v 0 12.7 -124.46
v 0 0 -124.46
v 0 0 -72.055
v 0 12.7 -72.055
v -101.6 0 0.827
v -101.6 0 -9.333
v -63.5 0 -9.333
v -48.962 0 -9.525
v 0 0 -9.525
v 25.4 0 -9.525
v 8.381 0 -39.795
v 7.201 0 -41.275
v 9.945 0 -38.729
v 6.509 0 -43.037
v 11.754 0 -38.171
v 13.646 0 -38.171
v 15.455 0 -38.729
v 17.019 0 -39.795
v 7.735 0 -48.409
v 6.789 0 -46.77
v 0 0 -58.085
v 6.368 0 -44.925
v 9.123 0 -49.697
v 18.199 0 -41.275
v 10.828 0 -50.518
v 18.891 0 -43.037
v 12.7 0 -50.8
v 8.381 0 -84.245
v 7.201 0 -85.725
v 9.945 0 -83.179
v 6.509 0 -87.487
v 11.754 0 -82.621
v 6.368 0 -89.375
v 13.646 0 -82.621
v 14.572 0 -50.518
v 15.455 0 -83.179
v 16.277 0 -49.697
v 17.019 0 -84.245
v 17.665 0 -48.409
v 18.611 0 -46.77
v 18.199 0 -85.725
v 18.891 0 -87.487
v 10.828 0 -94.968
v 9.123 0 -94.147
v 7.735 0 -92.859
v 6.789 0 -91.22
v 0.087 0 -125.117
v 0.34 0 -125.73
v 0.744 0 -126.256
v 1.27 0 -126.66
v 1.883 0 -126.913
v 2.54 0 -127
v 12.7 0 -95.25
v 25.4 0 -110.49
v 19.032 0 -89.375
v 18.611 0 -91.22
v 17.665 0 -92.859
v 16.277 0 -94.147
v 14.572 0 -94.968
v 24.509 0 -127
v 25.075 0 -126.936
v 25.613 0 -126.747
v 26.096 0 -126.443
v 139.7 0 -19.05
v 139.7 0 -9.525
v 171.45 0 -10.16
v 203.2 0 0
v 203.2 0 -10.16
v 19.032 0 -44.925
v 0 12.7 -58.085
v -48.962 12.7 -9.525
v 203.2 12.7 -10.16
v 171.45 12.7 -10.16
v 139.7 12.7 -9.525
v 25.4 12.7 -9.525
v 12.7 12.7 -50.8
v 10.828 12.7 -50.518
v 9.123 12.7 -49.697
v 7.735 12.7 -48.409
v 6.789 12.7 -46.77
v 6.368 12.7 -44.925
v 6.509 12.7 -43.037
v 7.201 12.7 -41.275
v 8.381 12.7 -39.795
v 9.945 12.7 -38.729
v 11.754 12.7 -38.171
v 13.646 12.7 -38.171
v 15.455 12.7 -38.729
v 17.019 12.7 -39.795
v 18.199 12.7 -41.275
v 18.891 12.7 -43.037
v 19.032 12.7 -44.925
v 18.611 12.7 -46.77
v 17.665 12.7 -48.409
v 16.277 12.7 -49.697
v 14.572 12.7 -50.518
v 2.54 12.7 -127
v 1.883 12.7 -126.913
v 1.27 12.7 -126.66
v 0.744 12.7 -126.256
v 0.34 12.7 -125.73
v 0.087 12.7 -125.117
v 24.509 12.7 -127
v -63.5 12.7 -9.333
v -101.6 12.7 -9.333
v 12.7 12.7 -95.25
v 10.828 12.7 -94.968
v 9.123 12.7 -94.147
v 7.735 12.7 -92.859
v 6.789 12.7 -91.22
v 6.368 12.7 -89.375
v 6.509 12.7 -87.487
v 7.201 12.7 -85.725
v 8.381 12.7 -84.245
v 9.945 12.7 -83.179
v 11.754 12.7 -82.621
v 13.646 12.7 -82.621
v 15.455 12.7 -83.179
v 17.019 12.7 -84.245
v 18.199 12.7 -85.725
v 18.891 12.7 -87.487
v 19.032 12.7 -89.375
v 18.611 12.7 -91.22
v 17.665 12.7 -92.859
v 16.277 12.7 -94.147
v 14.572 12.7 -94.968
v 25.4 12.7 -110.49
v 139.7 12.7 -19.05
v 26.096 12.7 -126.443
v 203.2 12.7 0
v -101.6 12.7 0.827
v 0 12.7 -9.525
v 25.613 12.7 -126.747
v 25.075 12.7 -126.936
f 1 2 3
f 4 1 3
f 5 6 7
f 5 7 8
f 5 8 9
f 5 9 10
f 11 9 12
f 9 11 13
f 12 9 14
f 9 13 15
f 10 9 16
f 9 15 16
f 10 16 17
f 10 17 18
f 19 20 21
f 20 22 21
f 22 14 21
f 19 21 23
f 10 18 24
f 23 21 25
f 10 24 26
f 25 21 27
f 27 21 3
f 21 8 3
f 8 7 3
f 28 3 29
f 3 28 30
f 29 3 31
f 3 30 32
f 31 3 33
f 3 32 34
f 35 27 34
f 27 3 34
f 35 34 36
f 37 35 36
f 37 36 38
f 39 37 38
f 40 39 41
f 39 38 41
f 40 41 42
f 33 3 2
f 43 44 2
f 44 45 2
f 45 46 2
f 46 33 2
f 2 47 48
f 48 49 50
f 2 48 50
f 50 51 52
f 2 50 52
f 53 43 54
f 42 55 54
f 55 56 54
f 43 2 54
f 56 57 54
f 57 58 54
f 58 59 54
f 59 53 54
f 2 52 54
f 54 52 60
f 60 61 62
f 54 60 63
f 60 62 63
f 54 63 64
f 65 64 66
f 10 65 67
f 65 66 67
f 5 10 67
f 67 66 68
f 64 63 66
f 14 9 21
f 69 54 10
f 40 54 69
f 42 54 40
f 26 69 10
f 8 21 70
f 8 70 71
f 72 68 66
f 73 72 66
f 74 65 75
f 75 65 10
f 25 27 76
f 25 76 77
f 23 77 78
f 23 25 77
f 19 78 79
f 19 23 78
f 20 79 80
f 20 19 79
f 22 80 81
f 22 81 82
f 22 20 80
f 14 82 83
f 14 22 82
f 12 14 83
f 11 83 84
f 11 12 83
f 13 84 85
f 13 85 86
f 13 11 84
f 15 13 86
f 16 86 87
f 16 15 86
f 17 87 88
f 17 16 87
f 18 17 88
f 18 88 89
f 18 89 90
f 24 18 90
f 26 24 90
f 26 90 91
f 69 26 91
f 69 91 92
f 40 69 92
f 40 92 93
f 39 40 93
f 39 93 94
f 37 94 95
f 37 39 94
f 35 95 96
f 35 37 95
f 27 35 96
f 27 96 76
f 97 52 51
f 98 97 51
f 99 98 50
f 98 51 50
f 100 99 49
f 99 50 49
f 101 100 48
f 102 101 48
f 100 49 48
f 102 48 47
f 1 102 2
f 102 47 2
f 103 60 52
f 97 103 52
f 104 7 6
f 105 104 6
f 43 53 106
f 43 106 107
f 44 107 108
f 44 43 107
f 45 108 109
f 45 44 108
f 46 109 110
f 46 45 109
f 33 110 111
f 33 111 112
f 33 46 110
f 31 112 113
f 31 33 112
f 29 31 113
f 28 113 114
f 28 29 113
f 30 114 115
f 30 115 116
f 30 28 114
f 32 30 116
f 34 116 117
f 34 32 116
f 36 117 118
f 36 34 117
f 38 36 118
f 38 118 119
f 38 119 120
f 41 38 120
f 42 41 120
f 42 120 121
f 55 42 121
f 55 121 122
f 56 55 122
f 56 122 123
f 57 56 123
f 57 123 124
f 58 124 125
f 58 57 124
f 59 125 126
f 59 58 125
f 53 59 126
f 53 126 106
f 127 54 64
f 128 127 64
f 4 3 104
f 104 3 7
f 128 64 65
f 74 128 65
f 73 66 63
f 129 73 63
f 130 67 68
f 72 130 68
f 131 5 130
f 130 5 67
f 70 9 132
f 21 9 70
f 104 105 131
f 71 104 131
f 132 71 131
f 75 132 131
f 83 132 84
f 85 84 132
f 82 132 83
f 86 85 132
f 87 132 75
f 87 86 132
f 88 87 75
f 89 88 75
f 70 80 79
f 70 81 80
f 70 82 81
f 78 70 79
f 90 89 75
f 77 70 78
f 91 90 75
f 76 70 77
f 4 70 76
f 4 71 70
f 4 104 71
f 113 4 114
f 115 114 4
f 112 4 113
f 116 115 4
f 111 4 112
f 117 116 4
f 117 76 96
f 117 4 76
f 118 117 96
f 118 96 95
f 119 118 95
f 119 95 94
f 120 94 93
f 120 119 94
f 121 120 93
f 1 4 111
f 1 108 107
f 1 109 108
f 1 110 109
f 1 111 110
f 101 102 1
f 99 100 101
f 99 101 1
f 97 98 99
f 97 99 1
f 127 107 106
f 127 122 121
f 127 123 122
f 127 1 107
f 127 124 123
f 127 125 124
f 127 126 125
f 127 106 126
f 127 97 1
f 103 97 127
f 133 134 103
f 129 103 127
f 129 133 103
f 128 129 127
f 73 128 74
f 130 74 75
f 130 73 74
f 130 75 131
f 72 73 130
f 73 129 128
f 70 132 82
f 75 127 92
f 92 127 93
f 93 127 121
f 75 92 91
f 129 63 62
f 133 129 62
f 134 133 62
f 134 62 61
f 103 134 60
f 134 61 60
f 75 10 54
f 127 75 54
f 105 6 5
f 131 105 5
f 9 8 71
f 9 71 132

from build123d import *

# Parameters (mm, degrees)
SKETCH1_R           = 6.35
BOSS_EXTRUDE1_DEPTH = 12.7


with BuildPart() as part:
    # Sketch1 → Boss-Extrude1 (new body)
    with BuildSketch(Plane(origin=(0, 0, 0), x_dir=(1, 0, 0), z_dir=(0, 1, 0))):
        with BuildLine():
            Line((171.45, 10.16), (26.09574153, 126.443406776))
            ThreePointArc((26.09574153, 126.443406776), (25.34977374, 126.856815931), (24.509016109, 127))
            Line((24.509016109, 127), (2.54, 127))
            ThreePointArc((2.54, 127), (0.743948776, 126.256051224), (0, 124.46))
            Line((0, 124.46), (0, 72.055027479))
            Line((0, 72.055027479), (-63.5, 9.332908944))
            Line((-63.5, 9.332908944), (-101.6, 9.332908944))
            Line((-101.6, 9.332908944), (-101.6, -0.827091056))
            Line((-101.6, -0.827091056), (203.2, 0))
            Line((203.2, 0), (203.2, 10.16))
            Line((203.2, 10.16), (171.45, 10.16))
        make_face()
        with Locations(Location((12.7, 88.9, 0), (0, 0, 90))):
            Circle(SKETCH1_R, mode=Mode.SUBTRACT)
        with Locations(Location((12.7, 44.45, 0), (0, 0, 90))):
            Circle(SKETCH1_R, mode=Mode.SUBTRACT)
        Polygon((0, 9.525), (0, 58.085027479), (-48.962001116, 9.525), align=None, mode=Mode.SUBTRACT)
        Polygon((25.4, 9.525), (25.4, 110.49), (139.7, 19.05), (139.7, 9.525), align=None, mode=Mode.SUBTRACT)
    extrude(amount=BOSS_EXTRUDE1_DEPTH)


solid = part.part
